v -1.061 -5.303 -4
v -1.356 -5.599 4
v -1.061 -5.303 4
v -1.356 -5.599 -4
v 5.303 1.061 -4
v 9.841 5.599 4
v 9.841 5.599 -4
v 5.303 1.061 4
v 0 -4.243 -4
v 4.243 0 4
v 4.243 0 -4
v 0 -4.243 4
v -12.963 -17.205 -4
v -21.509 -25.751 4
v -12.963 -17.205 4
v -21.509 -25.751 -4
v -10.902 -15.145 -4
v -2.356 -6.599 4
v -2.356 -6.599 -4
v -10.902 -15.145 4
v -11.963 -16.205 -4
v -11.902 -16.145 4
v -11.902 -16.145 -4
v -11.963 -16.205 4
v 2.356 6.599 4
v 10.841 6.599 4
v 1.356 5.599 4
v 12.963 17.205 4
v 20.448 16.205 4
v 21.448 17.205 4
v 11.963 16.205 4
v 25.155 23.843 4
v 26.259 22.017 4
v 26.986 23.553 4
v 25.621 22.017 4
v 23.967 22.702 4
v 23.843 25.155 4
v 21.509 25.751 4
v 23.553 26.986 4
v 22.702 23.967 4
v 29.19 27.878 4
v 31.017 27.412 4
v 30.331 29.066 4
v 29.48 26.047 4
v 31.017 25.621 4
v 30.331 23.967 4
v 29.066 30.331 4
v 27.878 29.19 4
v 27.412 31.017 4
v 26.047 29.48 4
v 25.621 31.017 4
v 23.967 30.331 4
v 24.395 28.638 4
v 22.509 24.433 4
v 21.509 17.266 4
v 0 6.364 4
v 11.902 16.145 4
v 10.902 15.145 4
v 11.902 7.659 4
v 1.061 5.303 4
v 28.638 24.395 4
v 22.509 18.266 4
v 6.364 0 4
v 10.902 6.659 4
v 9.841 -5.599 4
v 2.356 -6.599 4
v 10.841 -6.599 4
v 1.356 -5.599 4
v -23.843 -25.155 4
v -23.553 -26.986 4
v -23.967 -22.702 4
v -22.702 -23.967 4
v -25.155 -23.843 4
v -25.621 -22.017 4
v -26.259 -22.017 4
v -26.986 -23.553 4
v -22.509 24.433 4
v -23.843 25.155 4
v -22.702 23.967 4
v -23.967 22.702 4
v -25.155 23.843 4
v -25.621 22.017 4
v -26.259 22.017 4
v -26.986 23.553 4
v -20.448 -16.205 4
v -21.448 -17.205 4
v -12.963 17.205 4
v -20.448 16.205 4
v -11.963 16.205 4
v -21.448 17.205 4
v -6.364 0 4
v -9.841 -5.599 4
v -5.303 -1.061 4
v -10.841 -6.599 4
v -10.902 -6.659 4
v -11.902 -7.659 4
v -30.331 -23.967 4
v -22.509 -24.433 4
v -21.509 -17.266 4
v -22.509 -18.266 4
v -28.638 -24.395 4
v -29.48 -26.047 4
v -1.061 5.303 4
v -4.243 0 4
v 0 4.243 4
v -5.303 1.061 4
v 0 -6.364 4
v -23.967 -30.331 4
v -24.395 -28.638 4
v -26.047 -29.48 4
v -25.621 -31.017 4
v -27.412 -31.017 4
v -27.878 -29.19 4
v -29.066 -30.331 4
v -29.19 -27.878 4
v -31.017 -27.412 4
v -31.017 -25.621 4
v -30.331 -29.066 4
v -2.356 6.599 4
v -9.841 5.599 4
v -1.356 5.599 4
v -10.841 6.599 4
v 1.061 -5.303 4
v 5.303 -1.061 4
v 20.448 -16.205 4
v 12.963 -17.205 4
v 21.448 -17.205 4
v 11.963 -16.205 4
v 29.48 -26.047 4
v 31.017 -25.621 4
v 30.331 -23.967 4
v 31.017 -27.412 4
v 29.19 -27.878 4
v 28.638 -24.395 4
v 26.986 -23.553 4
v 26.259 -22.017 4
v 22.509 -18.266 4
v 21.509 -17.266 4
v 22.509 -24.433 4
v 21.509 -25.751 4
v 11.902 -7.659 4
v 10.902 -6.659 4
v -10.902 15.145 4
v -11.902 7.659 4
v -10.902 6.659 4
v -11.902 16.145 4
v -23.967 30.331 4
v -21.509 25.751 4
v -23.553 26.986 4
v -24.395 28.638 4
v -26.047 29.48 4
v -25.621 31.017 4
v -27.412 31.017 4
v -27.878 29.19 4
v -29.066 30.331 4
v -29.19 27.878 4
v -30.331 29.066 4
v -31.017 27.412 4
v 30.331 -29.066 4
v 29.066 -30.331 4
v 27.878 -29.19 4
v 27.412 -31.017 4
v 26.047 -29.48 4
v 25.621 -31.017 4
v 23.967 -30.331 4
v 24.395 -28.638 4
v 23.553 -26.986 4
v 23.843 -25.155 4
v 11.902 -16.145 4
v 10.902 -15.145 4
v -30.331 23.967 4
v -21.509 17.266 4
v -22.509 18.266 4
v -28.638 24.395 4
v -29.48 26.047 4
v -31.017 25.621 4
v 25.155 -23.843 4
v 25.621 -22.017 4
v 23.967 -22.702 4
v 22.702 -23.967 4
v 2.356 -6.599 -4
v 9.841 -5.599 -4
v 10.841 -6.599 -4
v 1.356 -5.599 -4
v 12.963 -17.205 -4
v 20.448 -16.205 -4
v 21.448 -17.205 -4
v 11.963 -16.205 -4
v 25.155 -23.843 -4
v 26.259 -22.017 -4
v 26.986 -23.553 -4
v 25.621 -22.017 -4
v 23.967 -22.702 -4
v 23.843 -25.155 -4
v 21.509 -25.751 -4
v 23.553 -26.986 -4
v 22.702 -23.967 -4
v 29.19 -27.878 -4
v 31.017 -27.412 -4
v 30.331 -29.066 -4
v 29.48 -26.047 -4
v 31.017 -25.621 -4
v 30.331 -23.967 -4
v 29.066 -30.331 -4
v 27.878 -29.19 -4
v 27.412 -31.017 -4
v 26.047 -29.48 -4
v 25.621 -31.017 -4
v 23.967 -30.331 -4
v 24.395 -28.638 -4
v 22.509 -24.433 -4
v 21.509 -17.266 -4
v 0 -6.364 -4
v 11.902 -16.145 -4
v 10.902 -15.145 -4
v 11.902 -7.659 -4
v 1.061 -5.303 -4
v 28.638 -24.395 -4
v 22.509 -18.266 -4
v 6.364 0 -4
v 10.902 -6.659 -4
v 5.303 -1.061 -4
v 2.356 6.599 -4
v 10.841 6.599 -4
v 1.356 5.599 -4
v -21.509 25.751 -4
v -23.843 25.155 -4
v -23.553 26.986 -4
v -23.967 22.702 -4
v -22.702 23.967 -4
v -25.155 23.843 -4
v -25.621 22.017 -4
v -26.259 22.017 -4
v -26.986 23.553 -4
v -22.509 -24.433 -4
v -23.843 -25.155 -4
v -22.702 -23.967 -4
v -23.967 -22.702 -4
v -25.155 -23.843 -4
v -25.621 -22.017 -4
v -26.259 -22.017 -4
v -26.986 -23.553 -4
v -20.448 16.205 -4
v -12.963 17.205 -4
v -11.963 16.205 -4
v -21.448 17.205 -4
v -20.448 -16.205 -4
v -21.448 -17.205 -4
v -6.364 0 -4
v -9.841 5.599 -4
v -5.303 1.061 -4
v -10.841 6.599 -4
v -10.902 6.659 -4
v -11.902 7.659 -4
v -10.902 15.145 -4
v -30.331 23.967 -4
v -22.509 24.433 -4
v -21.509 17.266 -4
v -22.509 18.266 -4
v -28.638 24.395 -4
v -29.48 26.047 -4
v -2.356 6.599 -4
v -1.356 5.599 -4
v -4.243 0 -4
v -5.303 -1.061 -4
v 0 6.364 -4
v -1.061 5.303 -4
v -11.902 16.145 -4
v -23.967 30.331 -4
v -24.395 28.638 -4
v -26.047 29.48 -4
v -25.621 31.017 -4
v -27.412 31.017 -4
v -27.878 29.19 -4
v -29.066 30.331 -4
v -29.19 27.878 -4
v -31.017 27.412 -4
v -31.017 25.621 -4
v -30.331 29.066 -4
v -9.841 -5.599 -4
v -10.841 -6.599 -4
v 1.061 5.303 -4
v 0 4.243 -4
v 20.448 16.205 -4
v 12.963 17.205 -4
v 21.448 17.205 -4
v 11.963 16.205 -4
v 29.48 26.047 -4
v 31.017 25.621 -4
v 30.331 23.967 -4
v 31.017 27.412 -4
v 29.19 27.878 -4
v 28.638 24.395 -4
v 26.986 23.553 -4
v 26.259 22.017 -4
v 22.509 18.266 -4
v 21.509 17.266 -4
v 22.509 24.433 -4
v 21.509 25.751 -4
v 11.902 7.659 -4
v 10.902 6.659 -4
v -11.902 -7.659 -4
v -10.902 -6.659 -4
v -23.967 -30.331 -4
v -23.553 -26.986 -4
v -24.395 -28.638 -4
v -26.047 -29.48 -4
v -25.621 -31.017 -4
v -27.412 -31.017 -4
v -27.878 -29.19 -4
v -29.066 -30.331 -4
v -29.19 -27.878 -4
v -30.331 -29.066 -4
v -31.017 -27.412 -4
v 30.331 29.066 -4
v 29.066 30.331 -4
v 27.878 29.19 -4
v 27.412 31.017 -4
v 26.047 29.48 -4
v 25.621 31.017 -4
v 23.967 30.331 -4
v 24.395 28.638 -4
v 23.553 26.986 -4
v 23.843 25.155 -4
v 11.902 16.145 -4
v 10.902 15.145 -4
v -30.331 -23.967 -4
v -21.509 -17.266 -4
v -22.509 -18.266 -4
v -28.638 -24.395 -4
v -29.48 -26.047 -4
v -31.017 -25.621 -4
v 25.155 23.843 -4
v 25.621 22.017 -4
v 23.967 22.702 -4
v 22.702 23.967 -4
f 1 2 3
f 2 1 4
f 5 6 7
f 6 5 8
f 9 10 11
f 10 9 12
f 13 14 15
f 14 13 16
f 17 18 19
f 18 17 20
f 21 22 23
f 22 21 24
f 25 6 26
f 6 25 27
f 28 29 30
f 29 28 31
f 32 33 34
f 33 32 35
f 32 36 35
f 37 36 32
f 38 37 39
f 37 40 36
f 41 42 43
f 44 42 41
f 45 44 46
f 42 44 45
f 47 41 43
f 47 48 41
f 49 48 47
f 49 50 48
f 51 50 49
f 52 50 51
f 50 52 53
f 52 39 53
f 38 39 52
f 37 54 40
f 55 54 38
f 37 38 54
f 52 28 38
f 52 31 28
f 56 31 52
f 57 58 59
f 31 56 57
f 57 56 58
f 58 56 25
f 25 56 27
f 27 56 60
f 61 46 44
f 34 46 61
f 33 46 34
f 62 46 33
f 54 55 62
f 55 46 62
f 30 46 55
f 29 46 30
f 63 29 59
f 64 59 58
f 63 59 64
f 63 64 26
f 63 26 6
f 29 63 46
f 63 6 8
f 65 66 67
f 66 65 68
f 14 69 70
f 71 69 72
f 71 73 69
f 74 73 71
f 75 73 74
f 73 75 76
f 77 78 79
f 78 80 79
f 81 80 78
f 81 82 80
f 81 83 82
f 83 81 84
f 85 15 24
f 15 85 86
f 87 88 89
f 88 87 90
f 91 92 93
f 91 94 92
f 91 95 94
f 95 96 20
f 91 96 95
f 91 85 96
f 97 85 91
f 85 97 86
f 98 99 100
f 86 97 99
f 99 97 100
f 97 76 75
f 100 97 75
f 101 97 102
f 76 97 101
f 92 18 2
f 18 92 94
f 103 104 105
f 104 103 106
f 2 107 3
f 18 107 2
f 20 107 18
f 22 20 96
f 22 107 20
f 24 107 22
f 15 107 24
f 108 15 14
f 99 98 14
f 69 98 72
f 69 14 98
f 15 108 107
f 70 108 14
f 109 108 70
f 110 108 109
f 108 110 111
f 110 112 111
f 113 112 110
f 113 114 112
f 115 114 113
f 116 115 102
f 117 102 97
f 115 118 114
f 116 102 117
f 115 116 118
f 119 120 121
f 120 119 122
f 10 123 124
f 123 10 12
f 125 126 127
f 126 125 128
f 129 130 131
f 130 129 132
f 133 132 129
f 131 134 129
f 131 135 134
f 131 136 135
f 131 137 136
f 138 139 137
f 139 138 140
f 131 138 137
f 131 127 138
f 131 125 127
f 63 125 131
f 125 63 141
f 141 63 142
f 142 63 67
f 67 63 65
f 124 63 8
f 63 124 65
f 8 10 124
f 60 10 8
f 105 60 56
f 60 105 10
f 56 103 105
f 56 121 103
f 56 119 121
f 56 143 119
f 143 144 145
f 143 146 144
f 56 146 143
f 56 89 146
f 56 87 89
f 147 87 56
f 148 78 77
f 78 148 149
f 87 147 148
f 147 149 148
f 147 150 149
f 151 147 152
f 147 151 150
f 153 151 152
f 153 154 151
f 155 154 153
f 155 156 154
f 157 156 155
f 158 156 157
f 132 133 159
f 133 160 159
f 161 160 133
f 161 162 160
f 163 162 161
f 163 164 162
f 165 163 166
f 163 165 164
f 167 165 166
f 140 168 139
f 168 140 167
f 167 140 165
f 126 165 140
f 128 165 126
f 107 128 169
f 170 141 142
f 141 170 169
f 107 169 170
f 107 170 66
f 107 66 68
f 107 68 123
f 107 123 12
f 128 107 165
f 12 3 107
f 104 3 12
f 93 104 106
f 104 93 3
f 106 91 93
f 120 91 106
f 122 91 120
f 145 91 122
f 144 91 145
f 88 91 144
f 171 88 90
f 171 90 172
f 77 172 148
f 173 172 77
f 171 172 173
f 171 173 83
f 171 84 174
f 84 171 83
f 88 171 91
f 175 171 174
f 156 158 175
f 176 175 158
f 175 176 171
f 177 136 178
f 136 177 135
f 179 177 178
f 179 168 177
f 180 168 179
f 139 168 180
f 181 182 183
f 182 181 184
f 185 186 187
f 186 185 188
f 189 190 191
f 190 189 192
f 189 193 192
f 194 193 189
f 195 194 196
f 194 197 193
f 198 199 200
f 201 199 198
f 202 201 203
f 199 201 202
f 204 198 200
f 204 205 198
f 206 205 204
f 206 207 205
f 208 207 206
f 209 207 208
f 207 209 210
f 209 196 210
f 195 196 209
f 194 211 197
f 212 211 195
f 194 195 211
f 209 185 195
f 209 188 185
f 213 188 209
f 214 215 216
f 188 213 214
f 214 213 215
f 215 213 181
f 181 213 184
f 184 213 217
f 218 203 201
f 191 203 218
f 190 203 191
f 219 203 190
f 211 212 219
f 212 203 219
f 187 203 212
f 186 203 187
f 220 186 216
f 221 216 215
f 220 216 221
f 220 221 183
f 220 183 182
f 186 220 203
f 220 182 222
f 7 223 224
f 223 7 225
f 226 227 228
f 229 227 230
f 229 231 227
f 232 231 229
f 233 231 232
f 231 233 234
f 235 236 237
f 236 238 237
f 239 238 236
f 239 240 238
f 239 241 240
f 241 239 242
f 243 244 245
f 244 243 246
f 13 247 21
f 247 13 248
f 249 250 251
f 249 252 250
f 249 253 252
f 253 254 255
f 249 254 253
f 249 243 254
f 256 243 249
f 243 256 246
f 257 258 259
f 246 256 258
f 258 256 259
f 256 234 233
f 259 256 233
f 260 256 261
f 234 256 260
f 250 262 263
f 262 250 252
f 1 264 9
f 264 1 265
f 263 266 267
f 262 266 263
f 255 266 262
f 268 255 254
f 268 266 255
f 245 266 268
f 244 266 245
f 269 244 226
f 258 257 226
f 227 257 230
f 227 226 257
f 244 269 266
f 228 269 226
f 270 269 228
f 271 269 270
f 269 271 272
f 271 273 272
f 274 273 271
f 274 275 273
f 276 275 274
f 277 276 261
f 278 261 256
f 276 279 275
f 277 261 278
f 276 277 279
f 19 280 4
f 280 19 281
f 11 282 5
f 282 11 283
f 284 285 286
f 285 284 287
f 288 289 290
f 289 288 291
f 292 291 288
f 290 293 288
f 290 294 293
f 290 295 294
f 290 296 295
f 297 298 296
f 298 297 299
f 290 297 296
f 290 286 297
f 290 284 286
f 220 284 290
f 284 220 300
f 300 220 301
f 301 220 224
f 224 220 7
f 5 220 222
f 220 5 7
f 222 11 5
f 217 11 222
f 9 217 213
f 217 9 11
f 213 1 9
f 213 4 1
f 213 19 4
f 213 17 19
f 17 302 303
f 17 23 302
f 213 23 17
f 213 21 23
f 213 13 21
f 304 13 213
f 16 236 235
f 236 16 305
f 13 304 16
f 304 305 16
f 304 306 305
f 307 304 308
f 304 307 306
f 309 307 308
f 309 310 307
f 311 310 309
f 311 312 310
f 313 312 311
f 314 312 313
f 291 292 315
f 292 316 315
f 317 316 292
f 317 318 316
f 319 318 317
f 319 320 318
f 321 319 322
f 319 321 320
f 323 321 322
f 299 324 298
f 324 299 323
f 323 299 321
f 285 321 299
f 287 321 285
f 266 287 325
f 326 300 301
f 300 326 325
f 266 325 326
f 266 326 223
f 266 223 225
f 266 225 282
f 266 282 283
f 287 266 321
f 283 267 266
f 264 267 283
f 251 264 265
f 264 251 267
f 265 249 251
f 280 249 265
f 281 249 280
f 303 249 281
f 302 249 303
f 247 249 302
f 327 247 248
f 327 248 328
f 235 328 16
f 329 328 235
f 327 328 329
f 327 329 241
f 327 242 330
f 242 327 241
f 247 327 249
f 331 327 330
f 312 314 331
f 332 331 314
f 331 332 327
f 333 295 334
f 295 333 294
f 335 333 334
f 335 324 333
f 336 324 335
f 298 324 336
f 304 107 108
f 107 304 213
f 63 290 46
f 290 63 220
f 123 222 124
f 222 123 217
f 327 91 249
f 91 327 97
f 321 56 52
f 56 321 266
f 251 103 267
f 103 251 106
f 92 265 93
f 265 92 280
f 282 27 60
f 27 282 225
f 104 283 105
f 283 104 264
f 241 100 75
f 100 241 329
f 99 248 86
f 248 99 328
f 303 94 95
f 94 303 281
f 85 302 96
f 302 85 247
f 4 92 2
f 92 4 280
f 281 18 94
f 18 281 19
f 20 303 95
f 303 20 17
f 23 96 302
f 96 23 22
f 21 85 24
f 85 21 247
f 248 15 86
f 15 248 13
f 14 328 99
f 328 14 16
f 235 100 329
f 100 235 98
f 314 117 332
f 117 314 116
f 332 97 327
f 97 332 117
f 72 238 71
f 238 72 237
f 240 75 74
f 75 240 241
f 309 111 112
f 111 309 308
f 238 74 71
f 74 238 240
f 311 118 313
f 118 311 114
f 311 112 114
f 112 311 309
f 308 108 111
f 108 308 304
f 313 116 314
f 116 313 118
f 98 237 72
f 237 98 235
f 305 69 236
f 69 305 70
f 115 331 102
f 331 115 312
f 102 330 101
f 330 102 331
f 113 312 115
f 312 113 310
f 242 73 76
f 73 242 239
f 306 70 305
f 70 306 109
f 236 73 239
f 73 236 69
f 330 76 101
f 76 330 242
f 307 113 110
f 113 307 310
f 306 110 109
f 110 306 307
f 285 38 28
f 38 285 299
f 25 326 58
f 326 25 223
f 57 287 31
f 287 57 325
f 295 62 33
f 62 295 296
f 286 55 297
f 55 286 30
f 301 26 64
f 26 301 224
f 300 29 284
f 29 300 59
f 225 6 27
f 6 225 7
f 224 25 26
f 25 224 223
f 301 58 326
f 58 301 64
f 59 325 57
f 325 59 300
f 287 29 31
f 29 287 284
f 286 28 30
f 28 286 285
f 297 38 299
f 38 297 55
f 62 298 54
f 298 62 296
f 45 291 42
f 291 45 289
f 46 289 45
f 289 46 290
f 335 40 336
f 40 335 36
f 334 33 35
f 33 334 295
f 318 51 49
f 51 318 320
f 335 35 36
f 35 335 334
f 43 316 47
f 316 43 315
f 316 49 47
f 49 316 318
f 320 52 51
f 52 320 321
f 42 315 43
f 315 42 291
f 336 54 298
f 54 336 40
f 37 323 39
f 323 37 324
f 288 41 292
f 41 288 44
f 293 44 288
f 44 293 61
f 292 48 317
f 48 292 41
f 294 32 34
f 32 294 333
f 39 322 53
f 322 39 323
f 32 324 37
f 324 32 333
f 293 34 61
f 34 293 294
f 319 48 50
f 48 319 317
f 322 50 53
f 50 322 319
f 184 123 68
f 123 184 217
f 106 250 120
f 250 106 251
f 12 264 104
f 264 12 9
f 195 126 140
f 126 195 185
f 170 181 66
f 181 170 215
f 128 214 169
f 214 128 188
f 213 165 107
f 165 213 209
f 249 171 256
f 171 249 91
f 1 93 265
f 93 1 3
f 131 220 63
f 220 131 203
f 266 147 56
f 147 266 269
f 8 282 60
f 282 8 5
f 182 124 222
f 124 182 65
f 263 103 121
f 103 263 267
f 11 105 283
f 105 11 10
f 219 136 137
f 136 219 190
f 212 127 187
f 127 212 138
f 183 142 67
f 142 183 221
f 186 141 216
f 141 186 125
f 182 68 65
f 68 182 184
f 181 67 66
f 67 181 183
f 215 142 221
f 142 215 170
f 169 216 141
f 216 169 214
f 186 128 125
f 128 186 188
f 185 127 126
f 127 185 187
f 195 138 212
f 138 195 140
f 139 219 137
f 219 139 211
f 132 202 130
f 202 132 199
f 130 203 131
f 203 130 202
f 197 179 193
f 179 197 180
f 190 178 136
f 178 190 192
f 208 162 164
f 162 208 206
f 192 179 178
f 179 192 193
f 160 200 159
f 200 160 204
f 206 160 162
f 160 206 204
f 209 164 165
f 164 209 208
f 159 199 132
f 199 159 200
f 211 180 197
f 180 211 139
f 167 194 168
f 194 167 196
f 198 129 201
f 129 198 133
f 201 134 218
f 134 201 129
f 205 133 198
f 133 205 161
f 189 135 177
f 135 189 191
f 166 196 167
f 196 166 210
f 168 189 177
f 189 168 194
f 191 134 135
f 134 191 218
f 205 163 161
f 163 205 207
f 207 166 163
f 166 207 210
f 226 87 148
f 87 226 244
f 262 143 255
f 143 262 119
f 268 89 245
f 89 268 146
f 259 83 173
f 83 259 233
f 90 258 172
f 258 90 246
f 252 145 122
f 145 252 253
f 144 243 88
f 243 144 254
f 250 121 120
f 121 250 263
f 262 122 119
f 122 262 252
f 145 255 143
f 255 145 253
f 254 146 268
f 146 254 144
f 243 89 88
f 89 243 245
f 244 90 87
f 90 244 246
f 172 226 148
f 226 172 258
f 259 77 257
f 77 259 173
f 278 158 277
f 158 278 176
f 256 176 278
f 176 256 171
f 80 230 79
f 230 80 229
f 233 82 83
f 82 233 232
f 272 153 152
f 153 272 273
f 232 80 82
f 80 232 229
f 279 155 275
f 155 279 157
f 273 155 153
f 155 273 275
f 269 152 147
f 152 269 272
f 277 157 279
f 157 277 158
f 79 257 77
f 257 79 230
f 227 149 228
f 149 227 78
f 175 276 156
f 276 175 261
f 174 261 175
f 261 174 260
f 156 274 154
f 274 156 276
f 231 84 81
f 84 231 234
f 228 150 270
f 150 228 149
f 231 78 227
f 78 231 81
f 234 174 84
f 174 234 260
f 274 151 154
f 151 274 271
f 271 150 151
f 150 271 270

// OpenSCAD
da6 = 1 / cos(180 / 6) / 2;
da8 = 1 / cos(180 / 8) / 2;

module accurate_hole(diam, height, sides=6) {
  r = diam * 1 / cos(180 / sides) / 2;

  cylinder(r=r,h=height,center=true,$fn=sides);
}

left = -1;
right = 1;
front = -1;
rear = 1;
top = 1;
bottom = -1;

wall_thickness = 1.5;
wall_height    = 8;

motor_diam = 6;
motor_height = 18;

rotor_dist = 75;
rotor_diam = 50;

battery_width = 10;
board_width = 12;
board_length = 18;
board_thickness = 2;

module main() {
  for(mirrored=[0,1]) {
    mirror([mirrored,0,0]) {
      for(a=[1,3]) {
        rotate([0,0,a*90+45]) arm();
      }
    }
  }

  translate([0,0,wall_height/2]) {
    % cube([board_width,board_length,2],center=true);
  }
}

module arm() {
  brace_dist = motor_diam/2+wall_thickness/2;
  brace_thickness = 1;
  angled_len = sqrt(pow(brace_dist*2, 2)*2);
  num_braces = (rotor_dist/2 - motor_diam/2) / (brace_dist*2);
  num_brace_remain = num_braces - floor(num_braces);

  module body() {
    translate([0,rotor_dist/2,0])
      rotate([0,0,11.25])
        accurate_hole(motor_diam+wall_thickness*2,wall_height,16);

    for(side=[left,right]) {
      translate([brace_dist*side,rotor_dist/4,0])
        cube([wall_thickness,rotor_dist/2,wall_height],center=true);
    }


    for(y=[1:floor(num_braces)]) {
      translate([0,y*brace_dist*2+brace_dist*num_brace_remain/2,0])
        rotate([0,0,45*(1-floor(y%2)*2)])
          cube([brace_thickness,angled_len,wall_height],center=true);
    }
  }

  module holes() {
    translate([0,rotor_dist/2,0])
      cylinder(r=motor_diam/2,h=wall_height+1,center=true);
  }

  difference() {
    body();
    holes();
  }
}

main();
//arm();
